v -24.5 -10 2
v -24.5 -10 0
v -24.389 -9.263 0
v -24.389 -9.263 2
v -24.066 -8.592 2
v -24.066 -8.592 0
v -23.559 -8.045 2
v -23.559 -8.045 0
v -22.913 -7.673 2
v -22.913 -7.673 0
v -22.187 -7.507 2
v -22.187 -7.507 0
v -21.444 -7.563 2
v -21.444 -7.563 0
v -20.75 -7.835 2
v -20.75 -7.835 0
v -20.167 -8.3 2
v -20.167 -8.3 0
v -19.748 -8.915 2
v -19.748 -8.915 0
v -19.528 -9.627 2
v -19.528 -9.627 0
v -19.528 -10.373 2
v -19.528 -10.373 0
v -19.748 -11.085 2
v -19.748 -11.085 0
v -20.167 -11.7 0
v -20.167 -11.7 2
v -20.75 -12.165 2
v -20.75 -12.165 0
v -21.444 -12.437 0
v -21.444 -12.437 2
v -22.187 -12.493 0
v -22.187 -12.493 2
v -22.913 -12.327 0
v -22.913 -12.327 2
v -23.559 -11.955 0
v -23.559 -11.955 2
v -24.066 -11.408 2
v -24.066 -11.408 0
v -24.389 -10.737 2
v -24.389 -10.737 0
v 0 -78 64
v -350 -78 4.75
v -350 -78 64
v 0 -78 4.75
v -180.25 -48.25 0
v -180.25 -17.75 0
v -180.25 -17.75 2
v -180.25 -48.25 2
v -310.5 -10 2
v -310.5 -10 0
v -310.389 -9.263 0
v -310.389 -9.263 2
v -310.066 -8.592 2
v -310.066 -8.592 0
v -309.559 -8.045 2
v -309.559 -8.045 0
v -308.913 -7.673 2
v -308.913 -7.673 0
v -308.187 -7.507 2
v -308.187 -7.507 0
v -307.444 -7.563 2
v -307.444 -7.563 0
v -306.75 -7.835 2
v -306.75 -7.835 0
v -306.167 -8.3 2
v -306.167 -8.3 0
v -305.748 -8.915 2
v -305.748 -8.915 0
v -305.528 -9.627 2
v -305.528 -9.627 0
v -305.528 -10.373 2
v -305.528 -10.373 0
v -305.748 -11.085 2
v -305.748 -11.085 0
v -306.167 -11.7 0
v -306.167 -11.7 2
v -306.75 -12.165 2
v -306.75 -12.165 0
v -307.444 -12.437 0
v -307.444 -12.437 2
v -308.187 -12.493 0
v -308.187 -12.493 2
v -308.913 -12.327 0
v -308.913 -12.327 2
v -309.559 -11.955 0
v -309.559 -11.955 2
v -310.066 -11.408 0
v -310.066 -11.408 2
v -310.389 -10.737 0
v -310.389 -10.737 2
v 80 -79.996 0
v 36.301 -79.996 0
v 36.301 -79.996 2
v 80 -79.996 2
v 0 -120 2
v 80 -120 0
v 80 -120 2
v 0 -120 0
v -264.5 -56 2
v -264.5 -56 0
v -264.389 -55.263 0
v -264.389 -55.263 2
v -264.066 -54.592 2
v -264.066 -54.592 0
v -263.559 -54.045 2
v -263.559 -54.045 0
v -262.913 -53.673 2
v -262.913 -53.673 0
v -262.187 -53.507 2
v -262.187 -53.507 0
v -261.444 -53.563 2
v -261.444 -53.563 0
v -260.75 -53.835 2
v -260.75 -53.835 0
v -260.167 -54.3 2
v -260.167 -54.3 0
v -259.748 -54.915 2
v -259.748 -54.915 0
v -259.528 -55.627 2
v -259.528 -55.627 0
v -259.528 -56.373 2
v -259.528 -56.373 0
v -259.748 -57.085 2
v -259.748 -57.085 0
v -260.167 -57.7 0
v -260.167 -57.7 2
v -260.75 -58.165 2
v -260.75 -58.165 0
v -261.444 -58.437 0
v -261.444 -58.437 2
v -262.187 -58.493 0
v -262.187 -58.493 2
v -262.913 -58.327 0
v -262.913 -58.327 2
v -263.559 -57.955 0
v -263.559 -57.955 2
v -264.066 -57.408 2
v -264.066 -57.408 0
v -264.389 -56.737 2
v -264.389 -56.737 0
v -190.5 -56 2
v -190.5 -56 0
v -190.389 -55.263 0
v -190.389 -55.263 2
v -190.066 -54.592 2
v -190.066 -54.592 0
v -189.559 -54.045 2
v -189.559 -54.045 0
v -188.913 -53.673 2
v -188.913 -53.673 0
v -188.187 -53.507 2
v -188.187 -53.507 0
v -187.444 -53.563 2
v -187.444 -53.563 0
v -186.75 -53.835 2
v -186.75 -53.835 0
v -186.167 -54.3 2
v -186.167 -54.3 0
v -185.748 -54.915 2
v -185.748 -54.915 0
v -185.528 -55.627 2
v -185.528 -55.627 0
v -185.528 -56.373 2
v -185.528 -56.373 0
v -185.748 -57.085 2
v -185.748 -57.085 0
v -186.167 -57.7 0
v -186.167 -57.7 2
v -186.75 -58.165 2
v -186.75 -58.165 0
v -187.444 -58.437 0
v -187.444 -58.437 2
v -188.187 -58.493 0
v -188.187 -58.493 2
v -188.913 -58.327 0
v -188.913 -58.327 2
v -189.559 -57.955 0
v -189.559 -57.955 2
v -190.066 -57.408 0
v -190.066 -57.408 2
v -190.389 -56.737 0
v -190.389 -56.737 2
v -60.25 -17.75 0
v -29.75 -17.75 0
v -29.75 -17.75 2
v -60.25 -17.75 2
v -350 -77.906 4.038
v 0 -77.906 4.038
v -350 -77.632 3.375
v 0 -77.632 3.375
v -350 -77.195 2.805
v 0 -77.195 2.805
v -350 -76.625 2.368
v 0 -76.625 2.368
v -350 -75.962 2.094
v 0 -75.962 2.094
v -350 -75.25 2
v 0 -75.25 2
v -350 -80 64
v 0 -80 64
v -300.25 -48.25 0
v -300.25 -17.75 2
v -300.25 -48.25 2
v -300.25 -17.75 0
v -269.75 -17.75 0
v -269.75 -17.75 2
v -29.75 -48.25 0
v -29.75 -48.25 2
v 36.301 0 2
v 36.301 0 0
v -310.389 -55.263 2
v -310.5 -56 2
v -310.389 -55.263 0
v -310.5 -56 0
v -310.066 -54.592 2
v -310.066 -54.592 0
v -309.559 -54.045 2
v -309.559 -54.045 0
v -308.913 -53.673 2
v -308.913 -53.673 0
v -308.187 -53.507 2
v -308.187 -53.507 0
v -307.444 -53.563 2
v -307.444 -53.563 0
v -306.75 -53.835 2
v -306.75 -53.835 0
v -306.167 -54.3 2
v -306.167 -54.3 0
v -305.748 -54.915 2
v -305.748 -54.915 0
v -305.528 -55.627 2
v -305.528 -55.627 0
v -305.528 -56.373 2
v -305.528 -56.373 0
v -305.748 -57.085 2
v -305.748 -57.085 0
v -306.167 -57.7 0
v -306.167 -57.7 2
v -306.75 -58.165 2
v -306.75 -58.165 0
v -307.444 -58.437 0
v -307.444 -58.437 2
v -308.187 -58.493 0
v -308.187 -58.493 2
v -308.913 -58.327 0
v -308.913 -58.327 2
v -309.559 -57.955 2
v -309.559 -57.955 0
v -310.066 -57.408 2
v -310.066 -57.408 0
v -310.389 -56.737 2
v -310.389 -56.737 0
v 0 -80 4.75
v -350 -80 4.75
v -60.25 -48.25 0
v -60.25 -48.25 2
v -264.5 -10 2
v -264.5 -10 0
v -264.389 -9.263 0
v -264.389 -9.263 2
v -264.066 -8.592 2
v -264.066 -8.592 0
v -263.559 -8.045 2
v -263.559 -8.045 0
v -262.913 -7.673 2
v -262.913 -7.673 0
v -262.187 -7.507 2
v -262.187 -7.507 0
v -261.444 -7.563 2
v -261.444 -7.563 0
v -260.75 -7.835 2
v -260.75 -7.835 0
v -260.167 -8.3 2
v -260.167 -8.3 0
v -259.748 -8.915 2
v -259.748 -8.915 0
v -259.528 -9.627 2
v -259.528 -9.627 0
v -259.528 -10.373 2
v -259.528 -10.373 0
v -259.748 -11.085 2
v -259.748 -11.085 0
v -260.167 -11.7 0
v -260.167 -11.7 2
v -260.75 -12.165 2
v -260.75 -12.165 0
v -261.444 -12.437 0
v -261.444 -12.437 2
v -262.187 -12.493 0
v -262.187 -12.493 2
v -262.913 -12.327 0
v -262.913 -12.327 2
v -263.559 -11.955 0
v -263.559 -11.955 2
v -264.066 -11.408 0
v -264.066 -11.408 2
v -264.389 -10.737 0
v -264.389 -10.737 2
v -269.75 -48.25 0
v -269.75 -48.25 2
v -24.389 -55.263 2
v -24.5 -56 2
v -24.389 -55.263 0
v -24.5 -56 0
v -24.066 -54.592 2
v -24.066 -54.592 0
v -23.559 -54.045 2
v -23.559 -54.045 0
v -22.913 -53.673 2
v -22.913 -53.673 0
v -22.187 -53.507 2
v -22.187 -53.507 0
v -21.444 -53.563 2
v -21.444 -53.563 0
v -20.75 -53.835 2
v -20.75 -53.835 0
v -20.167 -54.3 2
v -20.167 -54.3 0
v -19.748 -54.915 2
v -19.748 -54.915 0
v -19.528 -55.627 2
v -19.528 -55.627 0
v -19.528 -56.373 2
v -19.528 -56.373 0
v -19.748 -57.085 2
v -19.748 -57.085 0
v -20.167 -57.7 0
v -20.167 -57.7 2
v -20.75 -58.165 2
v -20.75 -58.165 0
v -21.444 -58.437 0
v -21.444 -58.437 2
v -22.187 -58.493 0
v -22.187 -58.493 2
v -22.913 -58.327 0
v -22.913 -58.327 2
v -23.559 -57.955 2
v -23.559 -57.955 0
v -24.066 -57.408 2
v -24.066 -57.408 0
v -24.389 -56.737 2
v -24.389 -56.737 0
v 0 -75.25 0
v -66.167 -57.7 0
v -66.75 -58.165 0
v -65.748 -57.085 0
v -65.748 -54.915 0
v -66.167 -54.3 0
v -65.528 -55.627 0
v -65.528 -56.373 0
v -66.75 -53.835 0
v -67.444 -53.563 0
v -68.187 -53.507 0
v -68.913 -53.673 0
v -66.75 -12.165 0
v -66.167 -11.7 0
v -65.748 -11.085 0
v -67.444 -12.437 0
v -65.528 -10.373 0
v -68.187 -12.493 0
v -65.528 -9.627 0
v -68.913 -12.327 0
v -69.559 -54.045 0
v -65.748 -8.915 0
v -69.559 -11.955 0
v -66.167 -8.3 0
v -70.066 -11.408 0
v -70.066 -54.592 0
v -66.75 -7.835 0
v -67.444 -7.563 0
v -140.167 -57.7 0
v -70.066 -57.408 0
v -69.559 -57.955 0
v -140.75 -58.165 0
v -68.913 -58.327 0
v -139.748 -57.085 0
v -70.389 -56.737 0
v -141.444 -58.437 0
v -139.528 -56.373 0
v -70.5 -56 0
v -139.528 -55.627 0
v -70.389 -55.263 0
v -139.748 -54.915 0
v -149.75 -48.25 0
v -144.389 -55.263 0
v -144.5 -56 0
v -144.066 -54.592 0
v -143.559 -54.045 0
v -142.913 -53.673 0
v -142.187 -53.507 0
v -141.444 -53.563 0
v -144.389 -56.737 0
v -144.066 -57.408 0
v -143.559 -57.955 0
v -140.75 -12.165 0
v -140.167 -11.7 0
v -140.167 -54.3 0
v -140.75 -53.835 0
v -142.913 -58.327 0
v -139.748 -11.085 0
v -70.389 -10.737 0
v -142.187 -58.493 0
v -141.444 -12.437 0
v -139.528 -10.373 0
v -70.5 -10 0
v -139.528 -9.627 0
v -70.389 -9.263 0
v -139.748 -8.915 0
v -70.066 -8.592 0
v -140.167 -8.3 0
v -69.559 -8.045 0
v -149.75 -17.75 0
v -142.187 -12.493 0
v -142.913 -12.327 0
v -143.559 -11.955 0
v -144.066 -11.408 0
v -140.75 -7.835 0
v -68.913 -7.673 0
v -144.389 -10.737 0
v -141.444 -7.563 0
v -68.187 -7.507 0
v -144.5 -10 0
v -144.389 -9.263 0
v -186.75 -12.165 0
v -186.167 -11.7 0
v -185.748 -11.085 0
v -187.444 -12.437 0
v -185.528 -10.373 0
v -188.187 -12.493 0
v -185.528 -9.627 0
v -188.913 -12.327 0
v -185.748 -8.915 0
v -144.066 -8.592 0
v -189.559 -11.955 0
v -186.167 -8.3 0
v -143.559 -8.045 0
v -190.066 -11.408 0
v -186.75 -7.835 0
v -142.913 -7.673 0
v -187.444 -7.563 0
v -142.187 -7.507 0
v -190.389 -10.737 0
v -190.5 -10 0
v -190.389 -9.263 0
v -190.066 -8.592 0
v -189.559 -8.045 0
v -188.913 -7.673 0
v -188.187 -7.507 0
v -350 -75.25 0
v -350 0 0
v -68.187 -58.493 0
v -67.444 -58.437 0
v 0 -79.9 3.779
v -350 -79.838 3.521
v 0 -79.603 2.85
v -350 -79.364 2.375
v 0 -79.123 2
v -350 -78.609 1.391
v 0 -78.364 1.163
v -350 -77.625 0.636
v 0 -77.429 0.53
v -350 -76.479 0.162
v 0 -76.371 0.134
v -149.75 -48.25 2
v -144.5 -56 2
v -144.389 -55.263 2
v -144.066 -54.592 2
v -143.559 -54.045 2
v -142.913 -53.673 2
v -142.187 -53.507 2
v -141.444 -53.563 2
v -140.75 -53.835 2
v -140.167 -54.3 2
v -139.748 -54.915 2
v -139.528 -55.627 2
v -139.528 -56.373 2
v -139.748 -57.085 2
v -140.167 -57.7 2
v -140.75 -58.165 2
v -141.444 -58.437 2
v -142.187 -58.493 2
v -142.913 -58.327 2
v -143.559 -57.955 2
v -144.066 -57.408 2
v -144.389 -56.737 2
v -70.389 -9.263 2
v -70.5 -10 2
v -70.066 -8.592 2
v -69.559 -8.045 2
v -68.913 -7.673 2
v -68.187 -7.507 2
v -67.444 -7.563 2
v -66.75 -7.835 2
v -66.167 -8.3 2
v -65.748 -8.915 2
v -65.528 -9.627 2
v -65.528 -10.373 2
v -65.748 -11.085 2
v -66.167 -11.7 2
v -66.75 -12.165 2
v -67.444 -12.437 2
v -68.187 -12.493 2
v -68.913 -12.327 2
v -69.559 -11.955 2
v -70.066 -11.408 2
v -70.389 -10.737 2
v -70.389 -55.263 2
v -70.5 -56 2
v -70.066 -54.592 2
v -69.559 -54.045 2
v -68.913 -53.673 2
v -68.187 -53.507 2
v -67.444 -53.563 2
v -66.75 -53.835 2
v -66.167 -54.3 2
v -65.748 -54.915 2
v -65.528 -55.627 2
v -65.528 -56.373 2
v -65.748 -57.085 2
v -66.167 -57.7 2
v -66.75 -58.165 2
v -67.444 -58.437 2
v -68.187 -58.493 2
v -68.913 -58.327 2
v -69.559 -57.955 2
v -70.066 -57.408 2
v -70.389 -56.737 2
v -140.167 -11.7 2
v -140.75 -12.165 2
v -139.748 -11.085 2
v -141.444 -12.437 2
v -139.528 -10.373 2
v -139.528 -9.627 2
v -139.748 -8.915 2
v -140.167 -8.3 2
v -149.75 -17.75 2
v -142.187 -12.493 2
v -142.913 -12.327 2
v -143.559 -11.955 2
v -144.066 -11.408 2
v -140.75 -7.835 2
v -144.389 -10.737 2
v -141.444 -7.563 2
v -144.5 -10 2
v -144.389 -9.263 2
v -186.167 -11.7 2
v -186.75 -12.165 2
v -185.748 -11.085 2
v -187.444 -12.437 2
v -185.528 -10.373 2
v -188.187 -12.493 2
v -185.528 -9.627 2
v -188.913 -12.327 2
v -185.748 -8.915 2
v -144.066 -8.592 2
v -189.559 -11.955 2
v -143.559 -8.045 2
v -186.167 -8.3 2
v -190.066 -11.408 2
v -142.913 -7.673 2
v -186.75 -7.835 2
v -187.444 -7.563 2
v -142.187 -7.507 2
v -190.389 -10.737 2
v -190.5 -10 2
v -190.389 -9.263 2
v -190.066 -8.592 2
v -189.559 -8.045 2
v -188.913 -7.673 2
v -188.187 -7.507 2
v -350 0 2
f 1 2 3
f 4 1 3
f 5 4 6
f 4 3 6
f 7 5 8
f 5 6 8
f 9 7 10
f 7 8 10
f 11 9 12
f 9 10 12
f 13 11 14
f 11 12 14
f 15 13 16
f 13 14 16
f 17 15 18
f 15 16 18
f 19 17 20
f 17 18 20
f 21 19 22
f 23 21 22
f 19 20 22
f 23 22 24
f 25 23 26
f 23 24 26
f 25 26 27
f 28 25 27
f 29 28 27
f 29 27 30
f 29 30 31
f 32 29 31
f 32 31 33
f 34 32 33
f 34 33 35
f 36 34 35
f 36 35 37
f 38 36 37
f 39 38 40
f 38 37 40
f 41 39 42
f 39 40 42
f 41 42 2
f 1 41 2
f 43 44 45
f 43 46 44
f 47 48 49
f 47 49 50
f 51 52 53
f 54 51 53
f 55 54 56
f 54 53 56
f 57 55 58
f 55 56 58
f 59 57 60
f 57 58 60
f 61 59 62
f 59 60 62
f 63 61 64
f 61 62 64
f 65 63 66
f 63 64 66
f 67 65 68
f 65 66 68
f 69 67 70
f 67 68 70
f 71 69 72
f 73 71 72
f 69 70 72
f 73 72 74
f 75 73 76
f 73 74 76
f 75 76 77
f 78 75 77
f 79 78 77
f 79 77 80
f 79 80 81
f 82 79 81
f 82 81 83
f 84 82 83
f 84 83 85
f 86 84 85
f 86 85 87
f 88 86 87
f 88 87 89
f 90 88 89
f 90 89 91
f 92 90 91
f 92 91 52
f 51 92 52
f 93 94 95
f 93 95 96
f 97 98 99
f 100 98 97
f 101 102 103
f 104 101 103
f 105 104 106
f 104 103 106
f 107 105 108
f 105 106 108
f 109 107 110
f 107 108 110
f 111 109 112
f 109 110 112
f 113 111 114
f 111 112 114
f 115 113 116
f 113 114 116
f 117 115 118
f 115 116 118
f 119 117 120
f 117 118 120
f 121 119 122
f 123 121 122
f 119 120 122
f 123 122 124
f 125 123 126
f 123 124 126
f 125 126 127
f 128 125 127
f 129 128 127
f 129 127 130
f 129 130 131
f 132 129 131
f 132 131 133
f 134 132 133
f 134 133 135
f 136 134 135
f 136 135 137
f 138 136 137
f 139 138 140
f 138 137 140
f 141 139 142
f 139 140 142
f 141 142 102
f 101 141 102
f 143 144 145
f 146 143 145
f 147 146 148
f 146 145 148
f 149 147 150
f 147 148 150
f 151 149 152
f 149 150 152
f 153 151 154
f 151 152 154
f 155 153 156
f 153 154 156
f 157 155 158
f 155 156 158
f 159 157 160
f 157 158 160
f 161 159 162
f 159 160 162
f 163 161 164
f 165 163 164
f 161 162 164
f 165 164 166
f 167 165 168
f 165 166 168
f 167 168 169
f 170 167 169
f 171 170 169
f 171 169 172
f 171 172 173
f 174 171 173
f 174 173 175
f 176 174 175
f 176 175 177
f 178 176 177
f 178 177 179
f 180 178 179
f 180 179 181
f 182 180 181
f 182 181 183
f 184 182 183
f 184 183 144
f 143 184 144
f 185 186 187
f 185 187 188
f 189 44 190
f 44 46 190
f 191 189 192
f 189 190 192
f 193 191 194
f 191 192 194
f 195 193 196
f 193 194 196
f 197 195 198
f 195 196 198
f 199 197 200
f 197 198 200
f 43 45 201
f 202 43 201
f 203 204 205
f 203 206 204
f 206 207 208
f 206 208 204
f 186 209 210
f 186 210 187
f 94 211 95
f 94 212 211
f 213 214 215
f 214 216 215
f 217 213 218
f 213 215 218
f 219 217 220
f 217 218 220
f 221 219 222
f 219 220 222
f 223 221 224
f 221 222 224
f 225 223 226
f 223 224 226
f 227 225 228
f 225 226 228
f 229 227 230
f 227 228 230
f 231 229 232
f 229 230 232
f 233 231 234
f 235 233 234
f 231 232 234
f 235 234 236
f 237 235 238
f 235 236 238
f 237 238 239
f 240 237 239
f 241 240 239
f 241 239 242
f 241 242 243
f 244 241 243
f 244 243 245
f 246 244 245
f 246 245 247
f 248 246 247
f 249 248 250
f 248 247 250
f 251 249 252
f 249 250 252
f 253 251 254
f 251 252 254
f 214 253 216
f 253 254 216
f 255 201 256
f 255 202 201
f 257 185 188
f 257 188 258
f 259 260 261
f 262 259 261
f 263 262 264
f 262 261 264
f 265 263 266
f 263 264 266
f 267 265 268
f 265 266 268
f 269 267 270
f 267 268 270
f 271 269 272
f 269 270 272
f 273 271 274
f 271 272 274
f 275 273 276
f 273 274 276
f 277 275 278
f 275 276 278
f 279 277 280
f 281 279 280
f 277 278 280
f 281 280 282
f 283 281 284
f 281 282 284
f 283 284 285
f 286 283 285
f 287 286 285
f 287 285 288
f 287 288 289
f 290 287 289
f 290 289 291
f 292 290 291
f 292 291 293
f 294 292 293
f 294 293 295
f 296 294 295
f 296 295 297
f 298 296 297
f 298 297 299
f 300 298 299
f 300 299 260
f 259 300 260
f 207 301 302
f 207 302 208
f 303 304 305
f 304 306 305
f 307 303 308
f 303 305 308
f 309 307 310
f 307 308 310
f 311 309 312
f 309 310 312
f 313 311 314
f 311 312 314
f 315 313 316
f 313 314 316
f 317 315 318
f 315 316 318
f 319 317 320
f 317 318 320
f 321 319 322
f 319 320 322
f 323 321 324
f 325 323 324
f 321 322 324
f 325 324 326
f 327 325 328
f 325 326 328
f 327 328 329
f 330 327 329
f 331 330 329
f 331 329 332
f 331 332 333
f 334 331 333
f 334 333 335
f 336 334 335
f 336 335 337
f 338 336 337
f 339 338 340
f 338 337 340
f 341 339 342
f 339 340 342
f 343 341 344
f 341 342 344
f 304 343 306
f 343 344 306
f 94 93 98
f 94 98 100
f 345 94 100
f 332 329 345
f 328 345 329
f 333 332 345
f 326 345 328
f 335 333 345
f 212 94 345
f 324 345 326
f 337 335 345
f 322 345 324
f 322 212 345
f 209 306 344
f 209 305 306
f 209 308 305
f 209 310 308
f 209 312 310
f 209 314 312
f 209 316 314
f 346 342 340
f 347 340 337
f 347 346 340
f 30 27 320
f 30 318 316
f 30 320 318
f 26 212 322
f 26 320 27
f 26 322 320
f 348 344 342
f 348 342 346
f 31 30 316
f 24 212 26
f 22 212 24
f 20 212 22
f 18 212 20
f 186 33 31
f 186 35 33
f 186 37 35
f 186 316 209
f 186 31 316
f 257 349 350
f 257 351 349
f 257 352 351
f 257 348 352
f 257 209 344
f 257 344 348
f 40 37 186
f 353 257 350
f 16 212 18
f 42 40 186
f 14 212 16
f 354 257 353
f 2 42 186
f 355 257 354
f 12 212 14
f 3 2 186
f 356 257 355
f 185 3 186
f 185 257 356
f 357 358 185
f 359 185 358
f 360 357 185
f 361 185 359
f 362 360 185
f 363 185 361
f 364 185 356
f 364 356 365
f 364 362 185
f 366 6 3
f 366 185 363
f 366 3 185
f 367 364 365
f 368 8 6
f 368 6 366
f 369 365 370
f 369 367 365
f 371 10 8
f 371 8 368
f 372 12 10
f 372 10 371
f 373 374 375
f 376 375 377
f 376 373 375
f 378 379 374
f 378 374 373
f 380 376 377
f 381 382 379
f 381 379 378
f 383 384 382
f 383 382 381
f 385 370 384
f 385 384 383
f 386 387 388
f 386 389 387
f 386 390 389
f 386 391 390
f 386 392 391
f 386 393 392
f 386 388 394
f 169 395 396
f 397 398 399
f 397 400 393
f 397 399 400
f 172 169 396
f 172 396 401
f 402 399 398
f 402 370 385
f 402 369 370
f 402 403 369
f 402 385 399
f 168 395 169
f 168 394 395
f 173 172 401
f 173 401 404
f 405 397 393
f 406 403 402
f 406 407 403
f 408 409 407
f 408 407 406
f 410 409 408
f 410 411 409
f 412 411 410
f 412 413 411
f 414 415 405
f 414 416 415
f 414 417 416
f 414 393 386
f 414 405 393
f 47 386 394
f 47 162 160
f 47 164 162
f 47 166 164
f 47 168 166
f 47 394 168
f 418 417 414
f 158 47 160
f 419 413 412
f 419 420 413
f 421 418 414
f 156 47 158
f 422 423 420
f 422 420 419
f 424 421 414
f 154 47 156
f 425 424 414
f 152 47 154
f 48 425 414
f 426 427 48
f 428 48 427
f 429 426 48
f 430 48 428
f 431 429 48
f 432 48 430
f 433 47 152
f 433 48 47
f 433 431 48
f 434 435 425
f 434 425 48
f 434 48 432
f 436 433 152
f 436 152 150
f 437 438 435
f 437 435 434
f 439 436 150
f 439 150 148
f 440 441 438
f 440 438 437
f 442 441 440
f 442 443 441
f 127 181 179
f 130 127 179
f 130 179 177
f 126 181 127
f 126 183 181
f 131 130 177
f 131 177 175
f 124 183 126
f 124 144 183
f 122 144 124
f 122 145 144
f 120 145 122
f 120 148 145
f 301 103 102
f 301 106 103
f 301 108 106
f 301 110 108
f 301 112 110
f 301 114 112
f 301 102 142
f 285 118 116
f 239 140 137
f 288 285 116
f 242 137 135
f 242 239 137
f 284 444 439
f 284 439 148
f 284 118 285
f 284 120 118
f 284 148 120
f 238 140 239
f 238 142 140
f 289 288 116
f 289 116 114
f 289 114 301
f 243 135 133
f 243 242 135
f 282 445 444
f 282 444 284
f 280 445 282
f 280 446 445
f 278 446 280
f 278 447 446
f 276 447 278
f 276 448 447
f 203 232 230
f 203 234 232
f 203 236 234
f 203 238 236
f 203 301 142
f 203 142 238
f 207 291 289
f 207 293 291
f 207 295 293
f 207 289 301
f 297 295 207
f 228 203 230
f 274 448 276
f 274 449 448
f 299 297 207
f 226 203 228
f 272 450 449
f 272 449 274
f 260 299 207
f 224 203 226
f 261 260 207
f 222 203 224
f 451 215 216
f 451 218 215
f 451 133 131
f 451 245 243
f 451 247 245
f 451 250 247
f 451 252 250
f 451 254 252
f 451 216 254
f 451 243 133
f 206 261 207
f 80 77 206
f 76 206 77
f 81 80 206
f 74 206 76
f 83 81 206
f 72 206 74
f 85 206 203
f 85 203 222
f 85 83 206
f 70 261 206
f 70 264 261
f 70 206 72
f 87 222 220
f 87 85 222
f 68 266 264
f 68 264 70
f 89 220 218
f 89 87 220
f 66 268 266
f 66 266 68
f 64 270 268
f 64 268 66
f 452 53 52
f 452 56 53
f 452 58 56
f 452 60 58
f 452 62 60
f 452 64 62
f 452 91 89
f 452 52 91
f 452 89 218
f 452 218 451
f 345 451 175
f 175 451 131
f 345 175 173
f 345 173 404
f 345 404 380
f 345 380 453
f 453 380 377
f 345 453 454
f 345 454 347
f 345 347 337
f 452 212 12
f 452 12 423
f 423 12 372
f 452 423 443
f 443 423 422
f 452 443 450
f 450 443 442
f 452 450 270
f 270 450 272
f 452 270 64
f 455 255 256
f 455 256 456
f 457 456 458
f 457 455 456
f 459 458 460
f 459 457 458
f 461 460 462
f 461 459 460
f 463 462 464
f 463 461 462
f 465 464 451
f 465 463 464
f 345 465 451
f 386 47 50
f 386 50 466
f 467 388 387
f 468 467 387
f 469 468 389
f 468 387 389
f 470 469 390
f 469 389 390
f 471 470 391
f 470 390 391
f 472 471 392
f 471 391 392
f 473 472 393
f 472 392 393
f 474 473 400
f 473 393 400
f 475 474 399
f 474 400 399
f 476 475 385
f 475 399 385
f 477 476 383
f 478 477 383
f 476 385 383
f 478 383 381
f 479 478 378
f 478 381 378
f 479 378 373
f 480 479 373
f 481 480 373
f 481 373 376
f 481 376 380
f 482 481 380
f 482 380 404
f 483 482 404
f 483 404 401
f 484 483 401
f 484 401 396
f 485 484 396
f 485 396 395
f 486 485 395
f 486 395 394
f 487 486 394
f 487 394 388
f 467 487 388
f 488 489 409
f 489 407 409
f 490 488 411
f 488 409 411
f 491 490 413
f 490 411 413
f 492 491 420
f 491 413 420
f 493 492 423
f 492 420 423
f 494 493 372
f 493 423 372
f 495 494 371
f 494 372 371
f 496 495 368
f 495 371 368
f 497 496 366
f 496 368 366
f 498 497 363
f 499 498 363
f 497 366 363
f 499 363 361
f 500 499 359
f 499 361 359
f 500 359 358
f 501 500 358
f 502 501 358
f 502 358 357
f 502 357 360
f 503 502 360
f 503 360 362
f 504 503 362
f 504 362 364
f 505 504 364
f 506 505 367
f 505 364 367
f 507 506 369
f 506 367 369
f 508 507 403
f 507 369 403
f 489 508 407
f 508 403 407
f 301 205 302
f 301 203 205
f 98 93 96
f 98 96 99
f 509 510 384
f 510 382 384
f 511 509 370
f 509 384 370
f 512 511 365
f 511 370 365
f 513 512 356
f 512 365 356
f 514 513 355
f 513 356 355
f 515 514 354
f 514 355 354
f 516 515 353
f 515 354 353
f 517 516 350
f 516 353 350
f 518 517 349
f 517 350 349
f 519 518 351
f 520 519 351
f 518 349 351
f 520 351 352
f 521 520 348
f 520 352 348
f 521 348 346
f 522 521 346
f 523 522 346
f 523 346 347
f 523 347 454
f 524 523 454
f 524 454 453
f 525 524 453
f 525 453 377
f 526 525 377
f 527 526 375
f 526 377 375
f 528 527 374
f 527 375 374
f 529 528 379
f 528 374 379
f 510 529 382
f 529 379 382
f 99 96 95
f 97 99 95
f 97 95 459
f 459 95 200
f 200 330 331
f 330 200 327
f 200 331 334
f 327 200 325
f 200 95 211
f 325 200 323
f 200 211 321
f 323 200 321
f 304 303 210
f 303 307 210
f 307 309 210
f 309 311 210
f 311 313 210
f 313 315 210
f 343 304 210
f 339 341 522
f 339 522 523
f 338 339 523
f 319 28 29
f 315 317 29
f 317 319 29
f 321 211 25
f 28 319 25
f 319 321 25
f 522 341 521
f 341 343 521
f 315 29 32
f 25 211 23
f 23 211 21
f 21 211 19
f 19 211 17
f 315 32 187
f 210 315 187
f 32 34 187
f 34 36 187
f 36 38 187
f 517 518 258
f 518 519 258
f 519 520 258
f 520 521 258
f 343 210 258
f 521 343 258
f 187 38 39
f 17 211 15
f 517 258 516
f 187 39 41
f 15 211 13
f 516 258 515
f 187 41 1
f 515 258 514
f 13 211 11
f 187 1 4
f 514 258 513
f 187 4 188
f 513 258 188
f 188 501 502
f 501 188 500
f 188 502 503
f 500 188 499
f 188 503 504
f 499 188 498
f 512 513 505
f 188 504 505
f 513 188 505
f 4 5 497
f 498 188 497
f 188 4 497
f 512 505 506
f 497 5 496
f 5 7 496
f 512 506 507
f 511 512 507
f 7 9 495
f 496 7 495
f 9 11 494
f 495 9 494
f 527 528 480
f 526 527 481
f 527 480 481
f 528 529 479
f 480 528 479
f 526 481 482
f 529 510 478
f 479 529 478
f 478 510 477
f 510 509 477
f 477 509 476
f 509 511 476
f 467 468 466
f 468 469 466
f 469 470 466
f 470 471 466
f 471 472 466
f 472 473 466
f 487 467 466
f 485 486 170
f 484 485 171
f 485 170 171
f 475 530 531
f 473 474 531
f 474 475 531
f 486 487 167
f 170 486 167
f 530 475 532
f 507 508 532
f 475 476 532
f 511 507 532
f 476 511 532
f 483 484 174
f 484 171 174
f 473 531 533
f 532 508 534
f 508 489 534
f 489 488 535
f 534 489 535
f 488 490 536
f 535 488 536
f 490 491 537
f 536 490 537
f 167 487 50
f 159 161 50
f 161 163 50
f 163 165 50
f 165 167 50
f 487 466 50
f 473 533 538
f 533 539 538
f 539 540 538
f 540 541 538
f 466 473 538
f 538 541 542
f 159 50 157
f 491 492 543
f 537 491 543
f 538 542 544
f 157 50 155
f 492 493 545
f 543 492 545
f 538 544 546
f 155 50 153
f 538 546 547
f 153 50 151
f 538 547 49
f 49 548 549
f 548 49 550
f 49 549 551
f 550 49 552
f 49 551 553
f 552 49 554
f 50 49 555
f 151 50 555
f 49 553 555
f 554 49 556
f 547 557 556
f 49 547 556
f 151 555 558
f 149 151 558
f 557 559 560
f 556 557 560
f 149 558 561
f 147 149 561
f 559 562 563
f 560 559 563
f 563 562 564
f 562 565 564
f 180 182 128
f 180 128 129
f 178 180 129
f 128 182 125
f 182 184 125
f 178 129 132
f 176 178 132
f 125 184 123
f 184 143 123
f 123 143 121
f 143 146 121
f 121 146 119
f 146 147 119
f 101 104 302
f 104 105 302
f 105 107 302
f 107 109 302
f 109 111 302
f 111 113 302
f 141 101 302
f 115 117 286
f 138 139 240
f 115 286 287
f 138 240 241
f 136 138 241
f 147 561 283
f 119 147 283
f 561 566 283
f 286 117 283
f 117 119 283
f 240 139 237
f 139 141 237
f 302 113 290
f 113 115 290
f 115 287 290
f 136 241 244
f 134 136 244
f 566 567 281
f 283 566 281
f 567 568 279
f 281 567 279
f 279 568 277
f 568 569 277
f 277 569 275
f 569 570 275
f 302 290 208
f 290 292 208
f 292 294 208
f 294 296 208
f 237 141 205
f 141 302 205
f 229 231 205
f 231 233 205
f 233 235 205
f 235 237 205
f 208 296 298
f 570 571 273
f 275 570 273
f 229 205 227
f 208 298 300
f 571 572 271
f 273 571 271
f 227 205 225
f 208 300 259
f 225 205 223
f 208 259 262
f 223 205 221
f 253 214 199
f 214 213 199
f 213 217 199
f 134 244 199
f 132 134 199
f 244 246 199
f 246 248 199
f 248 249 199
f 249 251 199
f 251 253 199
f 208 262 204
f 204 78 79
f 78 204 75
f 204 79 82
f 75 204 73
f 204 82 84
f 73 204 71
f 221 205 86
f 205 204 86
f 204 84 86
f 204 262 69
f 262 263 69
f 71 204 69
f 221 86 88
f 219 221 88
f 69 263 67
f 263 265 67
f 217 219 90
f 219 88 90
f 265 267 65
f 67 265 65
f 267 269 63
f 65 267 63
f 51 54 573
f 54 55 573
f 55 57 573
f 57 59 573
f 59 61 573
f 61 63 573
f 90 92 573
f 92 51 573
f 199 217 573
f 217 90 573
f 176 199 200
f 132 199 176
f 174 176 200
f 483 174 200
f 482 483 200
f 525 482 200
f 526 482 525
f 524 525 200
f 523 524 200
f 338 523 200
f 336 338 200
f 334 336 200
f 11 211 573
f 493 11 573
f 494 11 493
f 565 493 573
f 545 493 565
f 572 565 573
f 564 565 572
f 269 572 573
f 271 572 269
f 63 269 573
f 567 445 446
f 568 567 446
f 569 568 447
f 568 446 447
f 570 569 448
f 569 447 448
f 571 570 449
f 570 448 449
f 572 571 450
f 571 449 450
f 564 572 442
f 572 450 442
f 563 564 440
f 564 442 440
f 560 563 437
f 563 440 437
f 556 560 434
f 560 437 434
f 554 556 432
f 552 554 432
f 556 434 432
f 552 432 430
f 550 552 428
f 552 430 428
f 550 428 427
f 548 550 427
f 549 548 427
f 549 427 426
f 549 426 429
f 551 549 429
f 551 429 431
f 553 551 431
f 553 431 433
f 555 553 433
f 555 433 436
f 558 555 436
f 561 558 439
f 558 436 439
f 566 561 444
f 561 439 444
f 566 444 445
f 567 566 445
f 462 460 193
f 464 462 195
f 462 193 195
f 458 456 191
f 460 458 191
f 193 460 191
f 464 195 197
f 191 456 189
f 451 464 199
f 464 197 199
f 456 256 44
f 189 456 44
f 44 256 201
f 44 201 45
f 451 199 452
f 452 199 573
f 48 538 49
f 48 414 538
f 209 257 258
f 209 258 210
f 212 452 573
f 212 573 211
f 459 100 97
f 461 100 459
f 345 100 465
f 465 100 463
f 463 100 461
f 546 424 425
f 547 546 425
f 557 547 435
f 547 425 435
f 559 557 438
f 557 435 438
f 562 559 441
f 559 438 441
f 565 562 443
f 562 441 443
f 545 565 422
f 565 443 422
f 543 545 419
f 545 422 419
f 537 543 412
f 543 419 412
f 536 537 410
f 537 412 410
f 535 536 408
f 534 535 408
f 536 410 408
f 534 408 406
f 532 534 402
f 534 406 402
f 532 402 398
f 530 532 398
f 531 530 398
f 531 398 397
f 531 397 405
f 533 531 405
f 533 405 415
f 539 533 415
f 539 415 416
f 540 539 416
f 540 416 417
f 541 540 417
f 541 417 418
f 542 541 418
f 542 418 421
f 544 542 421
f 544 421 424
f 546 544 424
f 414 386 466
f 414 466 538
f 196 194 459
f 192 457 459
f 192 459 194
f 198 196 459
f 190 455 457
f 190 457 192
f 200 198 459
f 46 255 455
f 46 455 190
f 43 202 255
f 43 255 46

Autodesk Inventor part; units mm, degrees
ref_plane "YZ Plane" through (0, 0, 0) normal (1, 0, 0) x (0, 1, 0)
ref_plane "XZ Plane" through (0, 0, 0) normal (0, 1, 0) x (-1, 0, 0)
ref_plane "XY Plane" through (0, 0, 0) normal (0, 0, 1) x (1, 0, 0)
sketch "Sketch12" plane through (0, 0, 0) normal (0, 0, -1) x (-1, 0, 0)
  line L0 (0, 0) -> (-80, 0)
  line L1 (-80, 0) -> (-80, -120)
  line L2 (-80, -120) -> (0, -120)
  line L3 (0, -120) -> (0, 0)
  line L4 (-80, 0) -> (-36.3011, 0)
  line L5 (-36.3011, 0) -> (-36.3011, -79.996)
  line L6 (-36.3011, -79.996) -> (-80, -79.996)
  line L7 (-80, -79.996) -> (-80, 0)
  point P0 (-36.3011, 0)
  point P1 (-80, -79.996)
  dimension "d107" = 80
  dimension "d108" = 120
sketch "Sketch1" plane through (0, 0, 0) normal (0, 0, 1) x (1, 0, 0)
  line L0 (0, 0) -> (-350, 0)
  line L1 (0, -80) -> (0, 0)
  line L2 (-350, 0) -> (-350, -80)
  line L3 (-350, -80) -> (0, -80)
  point P0 (0, -40)
  dimension "d32" = 80
  dimension "d60" = 80
  dimension "d61" = 350
extrude "Plate1" add sketch "Sketch1" along normal blind 2
sketch "Sketch11" plane through (0, 0, 0) normal (0, 0, -1) x (-1, 0, 0)
  line L0 (60.25, -48.25) -> (29.75, -48.25)
  line L1 (29.75, -48.25) -> (29.75, -17.75)
  line L2 (29.75, -17.75) -> (60.25, -17.75)
  line L3 (60.25, -17.75) -> (60.25, -48.25)
  line L4 (60.25, -48.25) -> (29.75, -17.75) construction
  line L5 (29.75, -48.25) -> (60.25, -17.75) construction
  circle A0 centre (68, -56) radius 2.5
  circle A1 centre (22, -56) radius 2.5
  circle A2 centre (22, -10) radius 2.5
  circle A3 centre (68, -10) radius 2.5
  line L6 (29.75, -48.25) -> (22, -56) construction
  line L7 (0, -80) -> (0, 0) projected
  line L8 (0, 0) -> (350, 0) projected
  line L9 (350, -80) -> (0, -80) projected
  line L10 (22, -10) -> (68, -10) construction
  line L11 (68, -10) -> (68, -56) construction
  line L12 (68, -56) -> (22, -56) construction
  line L13 (22, -56) -> (22, -10) construction
  point P0 (45, -33)
  dimension "d88" = 30.5
  dimension "d89" = 30.5
  dimension "d90" = 5
  dimension "d92" = 10.9602
  dimension "d95" = 45
  dimension "d105" = 46
  dimension "d106" = 10
extrude "Extrusion2" cut sketch "Sketch11" against normal through all
sketch "Sketch9" plane through (-350, -78, 0) normal (0, -1, 0) x (1, 0, 0)
  line L0 (350, 0) -> (0, 0)
  line L1 (0, 0) -> (0, -64)
  line L2 (0, -64) -> (350, -64)
  line L3 (350, -64) -> (350, 0)
edge flange "Flange3" height 64 angle 90 thickness 2 bend radius 2.75 thickness toward (0, -1, 0) relief round relief width 2 relief depth 1 edges at (-175, -80, 0) wall of the first edge with corners at (0, -78, 0) (-350, -78, 0) (-350, -78, 64) (0, -78, 64)
bend "Bend3"
corner "Corner3"
pattern_linear "Rectangular Pattern2" count 3 spacing 120 along (-1, 0, 0) of "Extrusion2"
sheet face with bend "Face3" sketch "Sketch12" thickness 2 toward (0, 0, 1) bend radius 2.75 contours L3 L2 L1 L6 L5 L0
bend "Bend5"
equation "\"d2\" = Thickness"
equation "\"d62\" = BendReliefWidth"
equation "\"d63\" = BendReliefDepth"
equation "\"d64\" = MinimumRemnant"
equation "\"d65\" = TransitionRadius"
equation "\"d66\" = MAIN_7_central_window_width + 2 * Thickness"
equation "\"d68\" = BendRadius"
equation "\"d69\" = CornerReliefSize"
equation "\"d70\" = GapSize"
equation "\"d71\" = JacobiRadiusSize"
equation "\"BendReliefWidth\" = Thickness"
equation "\"BendReliefDepth\" = 0.5 * Thickness"
equation "\"CornerReliefSize\" = 4 * Thickness"
equation "\"MinimumRemnant\" = 2 * Thickness"
equation "\"TransitionRadius\" = BendRadius"
equation "\"JacobiRadiusSize\" = BendRadius"
equation "\"GapSize\" = Thickness"
equation "\"Thickness\" = 2"
equation "\"MAIN_7_central_window_width\" = 60"
equation "\"BendRadius\" = 2.75"
properties part number "PRS-1423 BOTTOM FDS diameter way down_CPY" material "Stainless Steel"
